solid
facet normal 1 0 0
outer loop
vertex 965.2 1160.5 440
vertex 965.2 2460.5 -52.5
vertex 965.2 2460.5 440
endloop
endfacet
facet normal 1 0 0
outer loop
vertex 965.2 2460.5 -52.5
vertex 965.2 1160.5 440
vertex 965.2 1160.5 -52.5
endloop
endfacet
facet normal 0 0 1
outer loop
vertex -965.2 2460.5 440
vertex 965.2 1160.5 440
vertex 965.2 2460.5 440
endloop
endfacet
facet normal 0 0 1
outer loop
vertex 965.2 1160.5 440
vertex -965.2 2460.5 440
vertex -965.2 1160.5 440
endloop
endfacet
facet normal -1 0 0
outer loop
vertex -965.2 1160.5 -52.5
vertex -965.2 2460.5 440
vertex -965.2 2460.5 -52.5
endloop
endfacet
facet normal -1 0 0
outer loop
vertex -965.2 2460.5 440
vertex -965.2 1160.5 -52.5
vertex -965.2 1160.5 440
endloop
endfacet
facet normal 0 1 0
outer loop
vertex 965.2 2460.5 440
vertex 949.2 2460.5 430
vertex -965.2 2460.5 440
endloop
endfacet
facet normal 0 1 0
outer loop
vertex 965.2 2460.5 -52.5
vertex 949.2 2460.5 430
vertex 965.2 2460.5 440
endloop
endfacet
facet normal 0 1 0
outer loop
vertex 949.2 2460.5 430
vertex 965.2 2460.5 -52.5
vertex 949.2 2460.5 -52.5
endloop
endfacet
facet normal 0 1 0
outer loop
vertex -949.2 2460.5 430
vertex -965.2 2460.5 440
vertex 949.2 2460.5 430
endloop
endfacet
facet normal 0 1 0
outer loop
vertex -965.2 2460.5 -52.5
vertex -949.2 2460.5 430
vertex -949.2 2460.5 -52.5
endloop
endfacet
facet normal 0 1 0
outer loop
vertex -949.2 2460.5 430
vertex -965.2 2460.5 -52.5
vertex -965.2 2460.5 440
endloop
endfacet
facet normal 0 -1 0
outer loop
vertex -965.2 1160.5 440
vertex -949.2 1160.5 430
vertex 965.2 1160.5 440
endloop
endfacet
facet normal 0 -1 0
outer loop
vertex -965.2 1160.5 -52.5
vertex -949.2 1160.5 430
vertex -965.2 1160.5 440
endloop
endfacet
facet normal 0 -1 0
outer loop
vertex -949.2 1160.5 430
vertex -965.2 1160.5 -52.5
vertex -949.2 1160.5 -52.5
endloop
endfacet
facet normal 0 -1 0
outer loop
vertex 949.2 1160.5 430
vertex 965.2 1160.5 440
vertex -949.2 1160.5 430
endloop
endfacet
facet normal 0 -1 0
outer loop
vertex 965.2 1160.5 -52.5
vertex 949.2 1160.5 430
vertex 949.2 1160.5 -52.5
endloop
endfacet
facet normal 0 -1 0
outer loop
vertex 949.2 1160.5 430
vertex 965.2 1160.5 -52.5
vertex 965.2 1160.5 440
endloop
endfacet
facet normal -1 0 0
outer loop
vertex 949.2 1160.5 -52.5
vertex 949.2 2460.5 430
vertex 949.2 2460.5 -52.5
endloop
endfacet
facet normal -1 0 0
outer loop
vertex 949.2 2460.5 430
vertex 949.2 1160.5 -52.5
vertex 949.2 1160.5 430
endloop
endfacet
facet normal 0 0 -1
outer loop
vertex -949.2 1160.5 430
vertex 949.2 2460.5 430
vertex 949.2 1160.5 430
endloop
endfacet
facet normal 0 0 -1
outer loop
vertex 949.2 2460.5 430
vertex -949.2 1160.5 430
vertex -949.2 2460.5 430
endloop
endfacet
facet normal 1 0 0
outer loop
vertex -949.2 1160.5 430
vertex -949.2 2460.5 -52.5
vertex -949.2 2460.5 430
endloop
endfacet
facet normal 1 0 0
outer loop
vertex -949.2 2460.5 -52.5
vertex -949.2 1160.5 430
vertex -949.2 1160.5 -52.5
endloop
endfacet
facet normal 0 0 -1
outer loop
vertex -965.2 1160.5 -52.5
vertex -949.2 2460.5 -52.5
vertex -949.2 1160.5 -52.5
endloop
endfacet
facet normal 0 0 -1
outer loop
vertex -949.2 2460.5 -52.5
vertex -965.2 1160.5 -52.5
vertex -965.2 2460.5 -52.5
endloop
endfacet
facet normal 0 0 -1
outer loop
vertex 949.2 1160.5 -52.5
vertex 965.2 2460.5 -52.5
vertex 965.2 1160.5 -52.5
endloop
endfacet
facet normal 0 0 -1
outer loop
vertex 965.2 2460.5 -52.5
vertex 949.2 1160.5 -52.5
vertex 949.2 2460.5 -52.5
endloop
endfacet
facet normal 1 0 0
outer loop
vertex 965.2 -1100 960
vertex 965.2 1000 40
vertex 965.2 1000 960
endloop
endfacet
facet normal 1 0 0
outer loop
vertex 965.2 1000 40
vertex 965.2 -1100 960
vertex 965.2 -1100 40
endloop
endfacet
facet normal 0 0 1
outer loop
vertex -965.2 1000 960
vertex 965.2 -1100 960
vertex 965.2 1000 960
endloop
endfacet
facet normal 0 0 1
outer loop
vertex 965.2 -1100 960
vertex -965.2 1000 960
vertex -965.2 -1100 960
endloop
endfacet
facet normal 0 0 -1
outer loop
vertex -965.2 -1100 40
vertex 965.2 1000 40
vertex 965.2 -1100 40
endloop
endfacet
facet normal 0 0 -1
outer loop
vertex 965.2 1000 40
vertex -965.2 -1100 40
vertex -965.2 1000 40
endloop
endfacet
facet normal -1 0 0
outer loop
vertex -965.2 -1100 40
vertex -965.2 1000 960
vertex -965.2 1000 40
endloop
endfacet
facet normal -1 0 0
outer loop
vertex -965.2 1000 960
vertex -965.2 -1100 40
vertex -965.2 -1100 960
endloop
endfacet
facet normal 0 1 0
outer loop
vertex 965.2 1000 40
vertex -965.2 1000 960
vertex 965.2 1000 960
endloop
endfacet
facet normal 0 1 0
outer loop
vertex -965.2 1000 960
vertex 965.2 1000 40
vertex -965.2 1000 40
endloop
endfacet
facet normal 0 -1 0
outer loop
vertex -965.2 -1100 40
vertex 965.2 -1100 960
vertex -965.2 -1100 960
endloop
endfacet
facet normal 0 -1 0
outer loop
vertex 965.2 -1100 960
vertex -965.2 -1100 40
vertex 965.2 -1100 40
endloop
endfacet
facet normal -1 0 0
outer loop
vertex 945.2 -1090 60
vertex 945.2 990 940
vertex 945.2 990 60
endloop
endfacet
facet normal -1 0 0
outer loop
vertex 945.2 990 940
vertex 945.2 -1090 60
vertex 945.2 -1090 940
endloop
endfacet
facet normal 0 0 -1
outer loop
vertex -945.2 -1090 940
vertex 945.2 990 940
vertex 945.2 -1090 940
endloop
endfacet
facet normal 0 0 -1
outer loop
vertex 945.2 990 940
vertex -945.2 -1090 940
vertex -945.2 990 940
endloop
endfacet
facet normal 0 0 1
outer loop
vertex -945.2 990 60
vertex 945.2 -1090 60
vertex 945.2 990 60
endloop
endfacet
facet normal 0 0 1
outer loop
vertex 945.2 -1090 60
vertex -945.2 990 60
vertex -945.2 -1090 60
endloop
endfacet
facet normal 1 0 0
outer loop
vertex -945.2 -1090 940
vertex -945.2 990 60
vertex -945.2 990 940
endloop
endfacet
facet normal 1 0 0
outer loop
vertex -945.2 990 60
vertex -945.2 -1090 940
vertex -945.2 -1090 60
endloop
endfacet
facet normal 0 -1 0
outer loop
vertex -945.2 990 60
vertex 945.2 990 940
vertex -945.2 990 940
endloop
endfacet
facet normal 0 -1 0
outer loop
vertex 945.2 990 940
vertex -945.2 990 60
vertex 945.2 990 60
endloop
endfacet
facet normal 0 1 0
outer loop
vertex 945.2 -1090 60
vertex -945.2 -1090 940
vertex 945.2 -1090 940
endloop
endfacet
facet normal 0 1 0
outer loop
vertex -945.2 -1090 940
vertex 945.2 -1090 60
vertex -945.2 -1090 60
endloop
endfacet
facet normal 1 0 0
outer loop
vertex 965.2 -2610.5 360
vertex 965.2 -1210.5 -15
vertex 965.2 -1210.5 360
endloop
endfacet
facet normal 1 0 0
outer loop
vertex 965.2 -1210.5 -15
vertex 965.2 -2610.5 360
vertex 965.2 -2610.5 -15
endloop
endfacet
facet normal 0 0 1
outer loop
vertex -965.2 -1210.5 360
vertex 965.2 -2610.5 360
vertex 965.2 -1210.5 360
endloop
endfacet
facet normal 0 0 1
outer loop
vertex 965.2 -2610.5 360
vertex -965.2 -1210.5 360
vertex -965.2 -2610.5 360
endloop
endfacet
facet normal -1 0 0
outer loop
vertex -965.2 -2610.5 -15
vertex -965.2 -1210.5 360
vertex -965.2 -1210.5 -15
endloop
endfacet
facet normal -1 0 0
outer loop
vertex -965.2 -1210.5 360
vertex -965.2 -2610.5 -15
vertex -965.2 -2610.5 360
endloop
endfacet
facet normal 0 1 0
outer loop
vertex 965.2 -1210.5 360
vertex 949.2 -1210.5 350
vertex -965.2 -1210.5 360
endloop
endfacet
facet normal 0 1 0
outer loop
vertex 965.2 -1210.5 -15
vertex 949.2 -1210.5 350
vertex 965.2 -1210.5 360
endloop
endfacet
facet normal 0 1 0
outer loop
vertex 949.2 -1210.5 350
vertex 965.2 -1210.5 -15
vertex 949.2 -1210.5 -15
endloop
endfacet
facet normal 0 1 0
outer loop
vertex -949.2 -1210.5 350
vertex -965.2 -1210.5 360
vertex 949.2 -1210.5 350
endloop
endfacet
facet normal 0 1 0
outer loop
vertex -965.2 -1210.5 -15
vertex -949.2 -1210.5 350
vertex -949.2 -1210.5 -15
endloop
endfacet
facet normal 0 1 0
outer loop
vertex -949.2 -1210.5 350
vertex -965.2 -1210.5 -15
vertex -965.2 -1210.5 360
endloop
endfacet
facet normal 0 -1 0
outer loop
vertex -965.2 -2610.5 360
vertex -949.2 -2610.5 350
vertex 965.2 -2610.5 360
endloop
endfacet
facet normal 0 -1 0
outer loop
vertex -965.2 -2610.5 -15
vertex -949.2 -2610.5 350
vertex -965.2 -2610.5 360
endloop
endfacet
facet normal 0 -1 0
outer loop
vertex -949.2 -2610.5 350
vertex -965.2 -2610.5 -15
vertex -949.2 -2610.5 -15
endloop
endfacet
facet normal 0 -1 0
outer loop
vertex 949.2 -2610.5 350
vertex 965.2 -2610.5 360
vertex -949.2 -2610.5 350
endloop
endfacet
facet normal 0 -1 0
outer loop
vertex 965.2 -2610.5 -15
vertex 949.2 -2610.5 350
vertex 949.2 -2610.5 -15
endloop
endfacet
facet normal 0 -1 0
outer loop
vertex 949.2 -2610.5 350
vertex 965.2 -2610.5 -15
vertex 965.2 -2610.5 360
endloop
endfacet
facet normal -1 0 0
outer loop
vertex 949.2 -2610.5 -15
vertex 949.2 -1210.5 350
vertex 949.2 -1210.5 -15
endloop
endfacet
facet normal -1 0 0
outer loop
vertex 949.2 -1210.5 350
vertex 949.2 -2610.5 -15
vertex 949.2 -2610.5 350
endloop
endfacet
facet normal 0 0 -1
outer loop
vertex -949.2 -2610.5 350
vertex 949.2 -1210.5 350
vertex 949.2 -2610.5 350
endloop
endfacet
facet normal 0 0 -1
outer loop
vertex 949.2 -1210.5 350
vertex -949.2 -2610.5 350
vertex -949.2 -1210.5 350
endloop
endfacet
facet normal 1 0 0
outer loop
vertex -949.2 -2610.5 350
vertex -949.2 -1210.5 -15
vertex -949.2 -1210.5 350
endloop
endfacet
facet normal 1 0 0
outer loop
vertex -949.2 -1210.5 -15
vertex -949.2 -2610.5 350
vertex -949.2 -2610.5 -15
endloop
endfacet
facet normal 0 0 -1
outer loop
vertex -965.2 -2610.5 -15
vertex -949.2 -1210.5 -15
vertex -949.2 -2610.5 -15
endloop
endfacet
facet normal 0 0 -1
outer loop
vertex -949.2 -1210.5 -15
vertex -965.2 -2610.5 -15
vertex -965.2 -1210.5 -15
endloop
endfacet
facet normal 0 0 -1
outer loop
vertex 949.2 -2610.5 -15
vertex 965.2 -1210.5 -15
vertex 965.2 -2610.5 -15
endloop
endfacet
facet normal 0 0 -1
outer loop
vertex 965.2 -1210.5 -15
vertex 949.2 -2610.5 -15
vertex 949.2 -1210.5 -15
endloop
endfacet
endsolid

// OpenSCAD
// ====================================================================================
// REVOLUTIONARY TECHNOLOGY COMPANY & UNIVERSITY OF WASHINGTON DEPARTMENT OF PHYSICS
// Subsystem: malibu_ss_4door_body.scad (2027 Malibu SS 4-Door Stamping Template)
// Core Application: 1969 Malibu Silhouette Mated to the Low-Slung COPO Frame Rails
// COMPLIANCE GATE: Maintains absolute 65mm lower open clearance for underbody armor
// Center Origin (0,0,0) = Geometric Centerpoint of the 115-Inch Intermediate Wheelbase
// ====================================================================================

$fn = 100; // Parametric panel contour surface finish tooling resolution

// --- 1969/2027 Malibu SS Intermediate Dimensions (mm) ---
inch_to_mm         = 25.4;
malibu_wheelbase   = 115.0 * inch_to_mm; // Exactly 2921.00 mm intermediate wheelbase stance
body_total_width   = 76.0 * inch_to_mm;  // 1930.40 mm compact mid-size track profile
sheet_metal_thick  = 1.50;               // Heavy fleet-gauge stamped steel skin scale

// Underbody Clearance Rule Compliance [INDEX]
UNDER_ARMOR_CLEARANCE_MM = 65.00;

module stamped_front_malibu_clip() {
    echo("STAMPING 2027 MALIBU SS 4-DOOR SEDAN HOOD AND FLAT FENDER LINERS");
    // Front clip housing the 1,350 Nm Square-Tooth propulsion engine core [INDEX]
    color("ButternutYellow") {
        difference() {
            // Front clip exterior boundary envelope
            translate([0, malibu_wheelbase/2 + 350, 150])
                cube([body_total_width, 1300, 580], center=true);
            
            // Hollow inner engine bay cavity clearing the front space-frame rails
            translate([0, malibu_wheelbase/2 + 350, 150])
                cube([body_total_width - 32, 1304, 560], center=true);
                
            // LOWER PROFILE STANDOFF: Cuts base line to leave open armor installation room [INDEX]
            translate([0, malibu_wheelbase/2 + 350, -150])
                cube([body_total_width + 10, 1310, UNDER_ARMOR_CLEARANCE_MM * 3], center=true);
                
            // MALIBU HORIZONTAL LIGHT BUCKETS: Sockets cut into front grille face for street lamps [INDEX]
            for (side = [-1, 1]) {
                translate([side * (body_total_width/2 - 140), malibu_wheelbase/2 + 1000, 220])
                    rotate([-90, 0, 0])
                        cylinder(d=146.05, h=40, center=true); // 5.75" intermediate lenses [INDEX]
            }
        }
    }
}

module midsize_4door_greenhouse() {
    // Stamped four-door sedan passenger cell matching 2016 fabric set profiles [INDEX]
    color("DarkSlateGrey") {
        difference() {
            // Main greenhouse roof and side pillar panels
            translate([0, -50, 500])
                cube([body_total_width, 2100, 920], center=true);
            // Hollow inner cockpit cave clearing the wave dashboard and pedal encoders [INDEX]
            translate([0, -50, 500])
                cube([body_total_width - 40, 2080, 880], center=true);
                
            // LOWER ROCKER PANEL ARMOR STANDOFF CLEARANCE (Rule Compliance) [INDEX]
            translate([0, -50, -30])
                cube([body_total_width + 10, 2110, UNDER_ARMOR_CLEARANCE_MM * 2], center=true);
        }
    }
}

module compact_rear_trunk_deck() {
    // Stamped rear trunk deck sheets matching intermediate fastback aspect ratios
    color("ButternutYellow") {
        translate([0, -malibu_wheelbase/2 - 450, 120]) {
            difference() {
                cube([body_total_width, 1400, 480], center=true);
                cube([body_total_width - 32, 1404, 460], center=true); // Hollow fuel tank pocket
                
                // Base clearance plane saving the 65mm underbody shield gap [INDEX]
                translate([0, 0, -200])
                    cube([body_total_width + 10, 1410, UNDER_ARMOR_CLEARANCE_MM * 2], center=true);
            }
        }
    }
}

// --- Composite Malibu SS Body Instantiation ---
union() {
    stamped_front_malibu_clip();
    midsize_4door_greenhouse();
    compact_rear_trunk_deck();
}
